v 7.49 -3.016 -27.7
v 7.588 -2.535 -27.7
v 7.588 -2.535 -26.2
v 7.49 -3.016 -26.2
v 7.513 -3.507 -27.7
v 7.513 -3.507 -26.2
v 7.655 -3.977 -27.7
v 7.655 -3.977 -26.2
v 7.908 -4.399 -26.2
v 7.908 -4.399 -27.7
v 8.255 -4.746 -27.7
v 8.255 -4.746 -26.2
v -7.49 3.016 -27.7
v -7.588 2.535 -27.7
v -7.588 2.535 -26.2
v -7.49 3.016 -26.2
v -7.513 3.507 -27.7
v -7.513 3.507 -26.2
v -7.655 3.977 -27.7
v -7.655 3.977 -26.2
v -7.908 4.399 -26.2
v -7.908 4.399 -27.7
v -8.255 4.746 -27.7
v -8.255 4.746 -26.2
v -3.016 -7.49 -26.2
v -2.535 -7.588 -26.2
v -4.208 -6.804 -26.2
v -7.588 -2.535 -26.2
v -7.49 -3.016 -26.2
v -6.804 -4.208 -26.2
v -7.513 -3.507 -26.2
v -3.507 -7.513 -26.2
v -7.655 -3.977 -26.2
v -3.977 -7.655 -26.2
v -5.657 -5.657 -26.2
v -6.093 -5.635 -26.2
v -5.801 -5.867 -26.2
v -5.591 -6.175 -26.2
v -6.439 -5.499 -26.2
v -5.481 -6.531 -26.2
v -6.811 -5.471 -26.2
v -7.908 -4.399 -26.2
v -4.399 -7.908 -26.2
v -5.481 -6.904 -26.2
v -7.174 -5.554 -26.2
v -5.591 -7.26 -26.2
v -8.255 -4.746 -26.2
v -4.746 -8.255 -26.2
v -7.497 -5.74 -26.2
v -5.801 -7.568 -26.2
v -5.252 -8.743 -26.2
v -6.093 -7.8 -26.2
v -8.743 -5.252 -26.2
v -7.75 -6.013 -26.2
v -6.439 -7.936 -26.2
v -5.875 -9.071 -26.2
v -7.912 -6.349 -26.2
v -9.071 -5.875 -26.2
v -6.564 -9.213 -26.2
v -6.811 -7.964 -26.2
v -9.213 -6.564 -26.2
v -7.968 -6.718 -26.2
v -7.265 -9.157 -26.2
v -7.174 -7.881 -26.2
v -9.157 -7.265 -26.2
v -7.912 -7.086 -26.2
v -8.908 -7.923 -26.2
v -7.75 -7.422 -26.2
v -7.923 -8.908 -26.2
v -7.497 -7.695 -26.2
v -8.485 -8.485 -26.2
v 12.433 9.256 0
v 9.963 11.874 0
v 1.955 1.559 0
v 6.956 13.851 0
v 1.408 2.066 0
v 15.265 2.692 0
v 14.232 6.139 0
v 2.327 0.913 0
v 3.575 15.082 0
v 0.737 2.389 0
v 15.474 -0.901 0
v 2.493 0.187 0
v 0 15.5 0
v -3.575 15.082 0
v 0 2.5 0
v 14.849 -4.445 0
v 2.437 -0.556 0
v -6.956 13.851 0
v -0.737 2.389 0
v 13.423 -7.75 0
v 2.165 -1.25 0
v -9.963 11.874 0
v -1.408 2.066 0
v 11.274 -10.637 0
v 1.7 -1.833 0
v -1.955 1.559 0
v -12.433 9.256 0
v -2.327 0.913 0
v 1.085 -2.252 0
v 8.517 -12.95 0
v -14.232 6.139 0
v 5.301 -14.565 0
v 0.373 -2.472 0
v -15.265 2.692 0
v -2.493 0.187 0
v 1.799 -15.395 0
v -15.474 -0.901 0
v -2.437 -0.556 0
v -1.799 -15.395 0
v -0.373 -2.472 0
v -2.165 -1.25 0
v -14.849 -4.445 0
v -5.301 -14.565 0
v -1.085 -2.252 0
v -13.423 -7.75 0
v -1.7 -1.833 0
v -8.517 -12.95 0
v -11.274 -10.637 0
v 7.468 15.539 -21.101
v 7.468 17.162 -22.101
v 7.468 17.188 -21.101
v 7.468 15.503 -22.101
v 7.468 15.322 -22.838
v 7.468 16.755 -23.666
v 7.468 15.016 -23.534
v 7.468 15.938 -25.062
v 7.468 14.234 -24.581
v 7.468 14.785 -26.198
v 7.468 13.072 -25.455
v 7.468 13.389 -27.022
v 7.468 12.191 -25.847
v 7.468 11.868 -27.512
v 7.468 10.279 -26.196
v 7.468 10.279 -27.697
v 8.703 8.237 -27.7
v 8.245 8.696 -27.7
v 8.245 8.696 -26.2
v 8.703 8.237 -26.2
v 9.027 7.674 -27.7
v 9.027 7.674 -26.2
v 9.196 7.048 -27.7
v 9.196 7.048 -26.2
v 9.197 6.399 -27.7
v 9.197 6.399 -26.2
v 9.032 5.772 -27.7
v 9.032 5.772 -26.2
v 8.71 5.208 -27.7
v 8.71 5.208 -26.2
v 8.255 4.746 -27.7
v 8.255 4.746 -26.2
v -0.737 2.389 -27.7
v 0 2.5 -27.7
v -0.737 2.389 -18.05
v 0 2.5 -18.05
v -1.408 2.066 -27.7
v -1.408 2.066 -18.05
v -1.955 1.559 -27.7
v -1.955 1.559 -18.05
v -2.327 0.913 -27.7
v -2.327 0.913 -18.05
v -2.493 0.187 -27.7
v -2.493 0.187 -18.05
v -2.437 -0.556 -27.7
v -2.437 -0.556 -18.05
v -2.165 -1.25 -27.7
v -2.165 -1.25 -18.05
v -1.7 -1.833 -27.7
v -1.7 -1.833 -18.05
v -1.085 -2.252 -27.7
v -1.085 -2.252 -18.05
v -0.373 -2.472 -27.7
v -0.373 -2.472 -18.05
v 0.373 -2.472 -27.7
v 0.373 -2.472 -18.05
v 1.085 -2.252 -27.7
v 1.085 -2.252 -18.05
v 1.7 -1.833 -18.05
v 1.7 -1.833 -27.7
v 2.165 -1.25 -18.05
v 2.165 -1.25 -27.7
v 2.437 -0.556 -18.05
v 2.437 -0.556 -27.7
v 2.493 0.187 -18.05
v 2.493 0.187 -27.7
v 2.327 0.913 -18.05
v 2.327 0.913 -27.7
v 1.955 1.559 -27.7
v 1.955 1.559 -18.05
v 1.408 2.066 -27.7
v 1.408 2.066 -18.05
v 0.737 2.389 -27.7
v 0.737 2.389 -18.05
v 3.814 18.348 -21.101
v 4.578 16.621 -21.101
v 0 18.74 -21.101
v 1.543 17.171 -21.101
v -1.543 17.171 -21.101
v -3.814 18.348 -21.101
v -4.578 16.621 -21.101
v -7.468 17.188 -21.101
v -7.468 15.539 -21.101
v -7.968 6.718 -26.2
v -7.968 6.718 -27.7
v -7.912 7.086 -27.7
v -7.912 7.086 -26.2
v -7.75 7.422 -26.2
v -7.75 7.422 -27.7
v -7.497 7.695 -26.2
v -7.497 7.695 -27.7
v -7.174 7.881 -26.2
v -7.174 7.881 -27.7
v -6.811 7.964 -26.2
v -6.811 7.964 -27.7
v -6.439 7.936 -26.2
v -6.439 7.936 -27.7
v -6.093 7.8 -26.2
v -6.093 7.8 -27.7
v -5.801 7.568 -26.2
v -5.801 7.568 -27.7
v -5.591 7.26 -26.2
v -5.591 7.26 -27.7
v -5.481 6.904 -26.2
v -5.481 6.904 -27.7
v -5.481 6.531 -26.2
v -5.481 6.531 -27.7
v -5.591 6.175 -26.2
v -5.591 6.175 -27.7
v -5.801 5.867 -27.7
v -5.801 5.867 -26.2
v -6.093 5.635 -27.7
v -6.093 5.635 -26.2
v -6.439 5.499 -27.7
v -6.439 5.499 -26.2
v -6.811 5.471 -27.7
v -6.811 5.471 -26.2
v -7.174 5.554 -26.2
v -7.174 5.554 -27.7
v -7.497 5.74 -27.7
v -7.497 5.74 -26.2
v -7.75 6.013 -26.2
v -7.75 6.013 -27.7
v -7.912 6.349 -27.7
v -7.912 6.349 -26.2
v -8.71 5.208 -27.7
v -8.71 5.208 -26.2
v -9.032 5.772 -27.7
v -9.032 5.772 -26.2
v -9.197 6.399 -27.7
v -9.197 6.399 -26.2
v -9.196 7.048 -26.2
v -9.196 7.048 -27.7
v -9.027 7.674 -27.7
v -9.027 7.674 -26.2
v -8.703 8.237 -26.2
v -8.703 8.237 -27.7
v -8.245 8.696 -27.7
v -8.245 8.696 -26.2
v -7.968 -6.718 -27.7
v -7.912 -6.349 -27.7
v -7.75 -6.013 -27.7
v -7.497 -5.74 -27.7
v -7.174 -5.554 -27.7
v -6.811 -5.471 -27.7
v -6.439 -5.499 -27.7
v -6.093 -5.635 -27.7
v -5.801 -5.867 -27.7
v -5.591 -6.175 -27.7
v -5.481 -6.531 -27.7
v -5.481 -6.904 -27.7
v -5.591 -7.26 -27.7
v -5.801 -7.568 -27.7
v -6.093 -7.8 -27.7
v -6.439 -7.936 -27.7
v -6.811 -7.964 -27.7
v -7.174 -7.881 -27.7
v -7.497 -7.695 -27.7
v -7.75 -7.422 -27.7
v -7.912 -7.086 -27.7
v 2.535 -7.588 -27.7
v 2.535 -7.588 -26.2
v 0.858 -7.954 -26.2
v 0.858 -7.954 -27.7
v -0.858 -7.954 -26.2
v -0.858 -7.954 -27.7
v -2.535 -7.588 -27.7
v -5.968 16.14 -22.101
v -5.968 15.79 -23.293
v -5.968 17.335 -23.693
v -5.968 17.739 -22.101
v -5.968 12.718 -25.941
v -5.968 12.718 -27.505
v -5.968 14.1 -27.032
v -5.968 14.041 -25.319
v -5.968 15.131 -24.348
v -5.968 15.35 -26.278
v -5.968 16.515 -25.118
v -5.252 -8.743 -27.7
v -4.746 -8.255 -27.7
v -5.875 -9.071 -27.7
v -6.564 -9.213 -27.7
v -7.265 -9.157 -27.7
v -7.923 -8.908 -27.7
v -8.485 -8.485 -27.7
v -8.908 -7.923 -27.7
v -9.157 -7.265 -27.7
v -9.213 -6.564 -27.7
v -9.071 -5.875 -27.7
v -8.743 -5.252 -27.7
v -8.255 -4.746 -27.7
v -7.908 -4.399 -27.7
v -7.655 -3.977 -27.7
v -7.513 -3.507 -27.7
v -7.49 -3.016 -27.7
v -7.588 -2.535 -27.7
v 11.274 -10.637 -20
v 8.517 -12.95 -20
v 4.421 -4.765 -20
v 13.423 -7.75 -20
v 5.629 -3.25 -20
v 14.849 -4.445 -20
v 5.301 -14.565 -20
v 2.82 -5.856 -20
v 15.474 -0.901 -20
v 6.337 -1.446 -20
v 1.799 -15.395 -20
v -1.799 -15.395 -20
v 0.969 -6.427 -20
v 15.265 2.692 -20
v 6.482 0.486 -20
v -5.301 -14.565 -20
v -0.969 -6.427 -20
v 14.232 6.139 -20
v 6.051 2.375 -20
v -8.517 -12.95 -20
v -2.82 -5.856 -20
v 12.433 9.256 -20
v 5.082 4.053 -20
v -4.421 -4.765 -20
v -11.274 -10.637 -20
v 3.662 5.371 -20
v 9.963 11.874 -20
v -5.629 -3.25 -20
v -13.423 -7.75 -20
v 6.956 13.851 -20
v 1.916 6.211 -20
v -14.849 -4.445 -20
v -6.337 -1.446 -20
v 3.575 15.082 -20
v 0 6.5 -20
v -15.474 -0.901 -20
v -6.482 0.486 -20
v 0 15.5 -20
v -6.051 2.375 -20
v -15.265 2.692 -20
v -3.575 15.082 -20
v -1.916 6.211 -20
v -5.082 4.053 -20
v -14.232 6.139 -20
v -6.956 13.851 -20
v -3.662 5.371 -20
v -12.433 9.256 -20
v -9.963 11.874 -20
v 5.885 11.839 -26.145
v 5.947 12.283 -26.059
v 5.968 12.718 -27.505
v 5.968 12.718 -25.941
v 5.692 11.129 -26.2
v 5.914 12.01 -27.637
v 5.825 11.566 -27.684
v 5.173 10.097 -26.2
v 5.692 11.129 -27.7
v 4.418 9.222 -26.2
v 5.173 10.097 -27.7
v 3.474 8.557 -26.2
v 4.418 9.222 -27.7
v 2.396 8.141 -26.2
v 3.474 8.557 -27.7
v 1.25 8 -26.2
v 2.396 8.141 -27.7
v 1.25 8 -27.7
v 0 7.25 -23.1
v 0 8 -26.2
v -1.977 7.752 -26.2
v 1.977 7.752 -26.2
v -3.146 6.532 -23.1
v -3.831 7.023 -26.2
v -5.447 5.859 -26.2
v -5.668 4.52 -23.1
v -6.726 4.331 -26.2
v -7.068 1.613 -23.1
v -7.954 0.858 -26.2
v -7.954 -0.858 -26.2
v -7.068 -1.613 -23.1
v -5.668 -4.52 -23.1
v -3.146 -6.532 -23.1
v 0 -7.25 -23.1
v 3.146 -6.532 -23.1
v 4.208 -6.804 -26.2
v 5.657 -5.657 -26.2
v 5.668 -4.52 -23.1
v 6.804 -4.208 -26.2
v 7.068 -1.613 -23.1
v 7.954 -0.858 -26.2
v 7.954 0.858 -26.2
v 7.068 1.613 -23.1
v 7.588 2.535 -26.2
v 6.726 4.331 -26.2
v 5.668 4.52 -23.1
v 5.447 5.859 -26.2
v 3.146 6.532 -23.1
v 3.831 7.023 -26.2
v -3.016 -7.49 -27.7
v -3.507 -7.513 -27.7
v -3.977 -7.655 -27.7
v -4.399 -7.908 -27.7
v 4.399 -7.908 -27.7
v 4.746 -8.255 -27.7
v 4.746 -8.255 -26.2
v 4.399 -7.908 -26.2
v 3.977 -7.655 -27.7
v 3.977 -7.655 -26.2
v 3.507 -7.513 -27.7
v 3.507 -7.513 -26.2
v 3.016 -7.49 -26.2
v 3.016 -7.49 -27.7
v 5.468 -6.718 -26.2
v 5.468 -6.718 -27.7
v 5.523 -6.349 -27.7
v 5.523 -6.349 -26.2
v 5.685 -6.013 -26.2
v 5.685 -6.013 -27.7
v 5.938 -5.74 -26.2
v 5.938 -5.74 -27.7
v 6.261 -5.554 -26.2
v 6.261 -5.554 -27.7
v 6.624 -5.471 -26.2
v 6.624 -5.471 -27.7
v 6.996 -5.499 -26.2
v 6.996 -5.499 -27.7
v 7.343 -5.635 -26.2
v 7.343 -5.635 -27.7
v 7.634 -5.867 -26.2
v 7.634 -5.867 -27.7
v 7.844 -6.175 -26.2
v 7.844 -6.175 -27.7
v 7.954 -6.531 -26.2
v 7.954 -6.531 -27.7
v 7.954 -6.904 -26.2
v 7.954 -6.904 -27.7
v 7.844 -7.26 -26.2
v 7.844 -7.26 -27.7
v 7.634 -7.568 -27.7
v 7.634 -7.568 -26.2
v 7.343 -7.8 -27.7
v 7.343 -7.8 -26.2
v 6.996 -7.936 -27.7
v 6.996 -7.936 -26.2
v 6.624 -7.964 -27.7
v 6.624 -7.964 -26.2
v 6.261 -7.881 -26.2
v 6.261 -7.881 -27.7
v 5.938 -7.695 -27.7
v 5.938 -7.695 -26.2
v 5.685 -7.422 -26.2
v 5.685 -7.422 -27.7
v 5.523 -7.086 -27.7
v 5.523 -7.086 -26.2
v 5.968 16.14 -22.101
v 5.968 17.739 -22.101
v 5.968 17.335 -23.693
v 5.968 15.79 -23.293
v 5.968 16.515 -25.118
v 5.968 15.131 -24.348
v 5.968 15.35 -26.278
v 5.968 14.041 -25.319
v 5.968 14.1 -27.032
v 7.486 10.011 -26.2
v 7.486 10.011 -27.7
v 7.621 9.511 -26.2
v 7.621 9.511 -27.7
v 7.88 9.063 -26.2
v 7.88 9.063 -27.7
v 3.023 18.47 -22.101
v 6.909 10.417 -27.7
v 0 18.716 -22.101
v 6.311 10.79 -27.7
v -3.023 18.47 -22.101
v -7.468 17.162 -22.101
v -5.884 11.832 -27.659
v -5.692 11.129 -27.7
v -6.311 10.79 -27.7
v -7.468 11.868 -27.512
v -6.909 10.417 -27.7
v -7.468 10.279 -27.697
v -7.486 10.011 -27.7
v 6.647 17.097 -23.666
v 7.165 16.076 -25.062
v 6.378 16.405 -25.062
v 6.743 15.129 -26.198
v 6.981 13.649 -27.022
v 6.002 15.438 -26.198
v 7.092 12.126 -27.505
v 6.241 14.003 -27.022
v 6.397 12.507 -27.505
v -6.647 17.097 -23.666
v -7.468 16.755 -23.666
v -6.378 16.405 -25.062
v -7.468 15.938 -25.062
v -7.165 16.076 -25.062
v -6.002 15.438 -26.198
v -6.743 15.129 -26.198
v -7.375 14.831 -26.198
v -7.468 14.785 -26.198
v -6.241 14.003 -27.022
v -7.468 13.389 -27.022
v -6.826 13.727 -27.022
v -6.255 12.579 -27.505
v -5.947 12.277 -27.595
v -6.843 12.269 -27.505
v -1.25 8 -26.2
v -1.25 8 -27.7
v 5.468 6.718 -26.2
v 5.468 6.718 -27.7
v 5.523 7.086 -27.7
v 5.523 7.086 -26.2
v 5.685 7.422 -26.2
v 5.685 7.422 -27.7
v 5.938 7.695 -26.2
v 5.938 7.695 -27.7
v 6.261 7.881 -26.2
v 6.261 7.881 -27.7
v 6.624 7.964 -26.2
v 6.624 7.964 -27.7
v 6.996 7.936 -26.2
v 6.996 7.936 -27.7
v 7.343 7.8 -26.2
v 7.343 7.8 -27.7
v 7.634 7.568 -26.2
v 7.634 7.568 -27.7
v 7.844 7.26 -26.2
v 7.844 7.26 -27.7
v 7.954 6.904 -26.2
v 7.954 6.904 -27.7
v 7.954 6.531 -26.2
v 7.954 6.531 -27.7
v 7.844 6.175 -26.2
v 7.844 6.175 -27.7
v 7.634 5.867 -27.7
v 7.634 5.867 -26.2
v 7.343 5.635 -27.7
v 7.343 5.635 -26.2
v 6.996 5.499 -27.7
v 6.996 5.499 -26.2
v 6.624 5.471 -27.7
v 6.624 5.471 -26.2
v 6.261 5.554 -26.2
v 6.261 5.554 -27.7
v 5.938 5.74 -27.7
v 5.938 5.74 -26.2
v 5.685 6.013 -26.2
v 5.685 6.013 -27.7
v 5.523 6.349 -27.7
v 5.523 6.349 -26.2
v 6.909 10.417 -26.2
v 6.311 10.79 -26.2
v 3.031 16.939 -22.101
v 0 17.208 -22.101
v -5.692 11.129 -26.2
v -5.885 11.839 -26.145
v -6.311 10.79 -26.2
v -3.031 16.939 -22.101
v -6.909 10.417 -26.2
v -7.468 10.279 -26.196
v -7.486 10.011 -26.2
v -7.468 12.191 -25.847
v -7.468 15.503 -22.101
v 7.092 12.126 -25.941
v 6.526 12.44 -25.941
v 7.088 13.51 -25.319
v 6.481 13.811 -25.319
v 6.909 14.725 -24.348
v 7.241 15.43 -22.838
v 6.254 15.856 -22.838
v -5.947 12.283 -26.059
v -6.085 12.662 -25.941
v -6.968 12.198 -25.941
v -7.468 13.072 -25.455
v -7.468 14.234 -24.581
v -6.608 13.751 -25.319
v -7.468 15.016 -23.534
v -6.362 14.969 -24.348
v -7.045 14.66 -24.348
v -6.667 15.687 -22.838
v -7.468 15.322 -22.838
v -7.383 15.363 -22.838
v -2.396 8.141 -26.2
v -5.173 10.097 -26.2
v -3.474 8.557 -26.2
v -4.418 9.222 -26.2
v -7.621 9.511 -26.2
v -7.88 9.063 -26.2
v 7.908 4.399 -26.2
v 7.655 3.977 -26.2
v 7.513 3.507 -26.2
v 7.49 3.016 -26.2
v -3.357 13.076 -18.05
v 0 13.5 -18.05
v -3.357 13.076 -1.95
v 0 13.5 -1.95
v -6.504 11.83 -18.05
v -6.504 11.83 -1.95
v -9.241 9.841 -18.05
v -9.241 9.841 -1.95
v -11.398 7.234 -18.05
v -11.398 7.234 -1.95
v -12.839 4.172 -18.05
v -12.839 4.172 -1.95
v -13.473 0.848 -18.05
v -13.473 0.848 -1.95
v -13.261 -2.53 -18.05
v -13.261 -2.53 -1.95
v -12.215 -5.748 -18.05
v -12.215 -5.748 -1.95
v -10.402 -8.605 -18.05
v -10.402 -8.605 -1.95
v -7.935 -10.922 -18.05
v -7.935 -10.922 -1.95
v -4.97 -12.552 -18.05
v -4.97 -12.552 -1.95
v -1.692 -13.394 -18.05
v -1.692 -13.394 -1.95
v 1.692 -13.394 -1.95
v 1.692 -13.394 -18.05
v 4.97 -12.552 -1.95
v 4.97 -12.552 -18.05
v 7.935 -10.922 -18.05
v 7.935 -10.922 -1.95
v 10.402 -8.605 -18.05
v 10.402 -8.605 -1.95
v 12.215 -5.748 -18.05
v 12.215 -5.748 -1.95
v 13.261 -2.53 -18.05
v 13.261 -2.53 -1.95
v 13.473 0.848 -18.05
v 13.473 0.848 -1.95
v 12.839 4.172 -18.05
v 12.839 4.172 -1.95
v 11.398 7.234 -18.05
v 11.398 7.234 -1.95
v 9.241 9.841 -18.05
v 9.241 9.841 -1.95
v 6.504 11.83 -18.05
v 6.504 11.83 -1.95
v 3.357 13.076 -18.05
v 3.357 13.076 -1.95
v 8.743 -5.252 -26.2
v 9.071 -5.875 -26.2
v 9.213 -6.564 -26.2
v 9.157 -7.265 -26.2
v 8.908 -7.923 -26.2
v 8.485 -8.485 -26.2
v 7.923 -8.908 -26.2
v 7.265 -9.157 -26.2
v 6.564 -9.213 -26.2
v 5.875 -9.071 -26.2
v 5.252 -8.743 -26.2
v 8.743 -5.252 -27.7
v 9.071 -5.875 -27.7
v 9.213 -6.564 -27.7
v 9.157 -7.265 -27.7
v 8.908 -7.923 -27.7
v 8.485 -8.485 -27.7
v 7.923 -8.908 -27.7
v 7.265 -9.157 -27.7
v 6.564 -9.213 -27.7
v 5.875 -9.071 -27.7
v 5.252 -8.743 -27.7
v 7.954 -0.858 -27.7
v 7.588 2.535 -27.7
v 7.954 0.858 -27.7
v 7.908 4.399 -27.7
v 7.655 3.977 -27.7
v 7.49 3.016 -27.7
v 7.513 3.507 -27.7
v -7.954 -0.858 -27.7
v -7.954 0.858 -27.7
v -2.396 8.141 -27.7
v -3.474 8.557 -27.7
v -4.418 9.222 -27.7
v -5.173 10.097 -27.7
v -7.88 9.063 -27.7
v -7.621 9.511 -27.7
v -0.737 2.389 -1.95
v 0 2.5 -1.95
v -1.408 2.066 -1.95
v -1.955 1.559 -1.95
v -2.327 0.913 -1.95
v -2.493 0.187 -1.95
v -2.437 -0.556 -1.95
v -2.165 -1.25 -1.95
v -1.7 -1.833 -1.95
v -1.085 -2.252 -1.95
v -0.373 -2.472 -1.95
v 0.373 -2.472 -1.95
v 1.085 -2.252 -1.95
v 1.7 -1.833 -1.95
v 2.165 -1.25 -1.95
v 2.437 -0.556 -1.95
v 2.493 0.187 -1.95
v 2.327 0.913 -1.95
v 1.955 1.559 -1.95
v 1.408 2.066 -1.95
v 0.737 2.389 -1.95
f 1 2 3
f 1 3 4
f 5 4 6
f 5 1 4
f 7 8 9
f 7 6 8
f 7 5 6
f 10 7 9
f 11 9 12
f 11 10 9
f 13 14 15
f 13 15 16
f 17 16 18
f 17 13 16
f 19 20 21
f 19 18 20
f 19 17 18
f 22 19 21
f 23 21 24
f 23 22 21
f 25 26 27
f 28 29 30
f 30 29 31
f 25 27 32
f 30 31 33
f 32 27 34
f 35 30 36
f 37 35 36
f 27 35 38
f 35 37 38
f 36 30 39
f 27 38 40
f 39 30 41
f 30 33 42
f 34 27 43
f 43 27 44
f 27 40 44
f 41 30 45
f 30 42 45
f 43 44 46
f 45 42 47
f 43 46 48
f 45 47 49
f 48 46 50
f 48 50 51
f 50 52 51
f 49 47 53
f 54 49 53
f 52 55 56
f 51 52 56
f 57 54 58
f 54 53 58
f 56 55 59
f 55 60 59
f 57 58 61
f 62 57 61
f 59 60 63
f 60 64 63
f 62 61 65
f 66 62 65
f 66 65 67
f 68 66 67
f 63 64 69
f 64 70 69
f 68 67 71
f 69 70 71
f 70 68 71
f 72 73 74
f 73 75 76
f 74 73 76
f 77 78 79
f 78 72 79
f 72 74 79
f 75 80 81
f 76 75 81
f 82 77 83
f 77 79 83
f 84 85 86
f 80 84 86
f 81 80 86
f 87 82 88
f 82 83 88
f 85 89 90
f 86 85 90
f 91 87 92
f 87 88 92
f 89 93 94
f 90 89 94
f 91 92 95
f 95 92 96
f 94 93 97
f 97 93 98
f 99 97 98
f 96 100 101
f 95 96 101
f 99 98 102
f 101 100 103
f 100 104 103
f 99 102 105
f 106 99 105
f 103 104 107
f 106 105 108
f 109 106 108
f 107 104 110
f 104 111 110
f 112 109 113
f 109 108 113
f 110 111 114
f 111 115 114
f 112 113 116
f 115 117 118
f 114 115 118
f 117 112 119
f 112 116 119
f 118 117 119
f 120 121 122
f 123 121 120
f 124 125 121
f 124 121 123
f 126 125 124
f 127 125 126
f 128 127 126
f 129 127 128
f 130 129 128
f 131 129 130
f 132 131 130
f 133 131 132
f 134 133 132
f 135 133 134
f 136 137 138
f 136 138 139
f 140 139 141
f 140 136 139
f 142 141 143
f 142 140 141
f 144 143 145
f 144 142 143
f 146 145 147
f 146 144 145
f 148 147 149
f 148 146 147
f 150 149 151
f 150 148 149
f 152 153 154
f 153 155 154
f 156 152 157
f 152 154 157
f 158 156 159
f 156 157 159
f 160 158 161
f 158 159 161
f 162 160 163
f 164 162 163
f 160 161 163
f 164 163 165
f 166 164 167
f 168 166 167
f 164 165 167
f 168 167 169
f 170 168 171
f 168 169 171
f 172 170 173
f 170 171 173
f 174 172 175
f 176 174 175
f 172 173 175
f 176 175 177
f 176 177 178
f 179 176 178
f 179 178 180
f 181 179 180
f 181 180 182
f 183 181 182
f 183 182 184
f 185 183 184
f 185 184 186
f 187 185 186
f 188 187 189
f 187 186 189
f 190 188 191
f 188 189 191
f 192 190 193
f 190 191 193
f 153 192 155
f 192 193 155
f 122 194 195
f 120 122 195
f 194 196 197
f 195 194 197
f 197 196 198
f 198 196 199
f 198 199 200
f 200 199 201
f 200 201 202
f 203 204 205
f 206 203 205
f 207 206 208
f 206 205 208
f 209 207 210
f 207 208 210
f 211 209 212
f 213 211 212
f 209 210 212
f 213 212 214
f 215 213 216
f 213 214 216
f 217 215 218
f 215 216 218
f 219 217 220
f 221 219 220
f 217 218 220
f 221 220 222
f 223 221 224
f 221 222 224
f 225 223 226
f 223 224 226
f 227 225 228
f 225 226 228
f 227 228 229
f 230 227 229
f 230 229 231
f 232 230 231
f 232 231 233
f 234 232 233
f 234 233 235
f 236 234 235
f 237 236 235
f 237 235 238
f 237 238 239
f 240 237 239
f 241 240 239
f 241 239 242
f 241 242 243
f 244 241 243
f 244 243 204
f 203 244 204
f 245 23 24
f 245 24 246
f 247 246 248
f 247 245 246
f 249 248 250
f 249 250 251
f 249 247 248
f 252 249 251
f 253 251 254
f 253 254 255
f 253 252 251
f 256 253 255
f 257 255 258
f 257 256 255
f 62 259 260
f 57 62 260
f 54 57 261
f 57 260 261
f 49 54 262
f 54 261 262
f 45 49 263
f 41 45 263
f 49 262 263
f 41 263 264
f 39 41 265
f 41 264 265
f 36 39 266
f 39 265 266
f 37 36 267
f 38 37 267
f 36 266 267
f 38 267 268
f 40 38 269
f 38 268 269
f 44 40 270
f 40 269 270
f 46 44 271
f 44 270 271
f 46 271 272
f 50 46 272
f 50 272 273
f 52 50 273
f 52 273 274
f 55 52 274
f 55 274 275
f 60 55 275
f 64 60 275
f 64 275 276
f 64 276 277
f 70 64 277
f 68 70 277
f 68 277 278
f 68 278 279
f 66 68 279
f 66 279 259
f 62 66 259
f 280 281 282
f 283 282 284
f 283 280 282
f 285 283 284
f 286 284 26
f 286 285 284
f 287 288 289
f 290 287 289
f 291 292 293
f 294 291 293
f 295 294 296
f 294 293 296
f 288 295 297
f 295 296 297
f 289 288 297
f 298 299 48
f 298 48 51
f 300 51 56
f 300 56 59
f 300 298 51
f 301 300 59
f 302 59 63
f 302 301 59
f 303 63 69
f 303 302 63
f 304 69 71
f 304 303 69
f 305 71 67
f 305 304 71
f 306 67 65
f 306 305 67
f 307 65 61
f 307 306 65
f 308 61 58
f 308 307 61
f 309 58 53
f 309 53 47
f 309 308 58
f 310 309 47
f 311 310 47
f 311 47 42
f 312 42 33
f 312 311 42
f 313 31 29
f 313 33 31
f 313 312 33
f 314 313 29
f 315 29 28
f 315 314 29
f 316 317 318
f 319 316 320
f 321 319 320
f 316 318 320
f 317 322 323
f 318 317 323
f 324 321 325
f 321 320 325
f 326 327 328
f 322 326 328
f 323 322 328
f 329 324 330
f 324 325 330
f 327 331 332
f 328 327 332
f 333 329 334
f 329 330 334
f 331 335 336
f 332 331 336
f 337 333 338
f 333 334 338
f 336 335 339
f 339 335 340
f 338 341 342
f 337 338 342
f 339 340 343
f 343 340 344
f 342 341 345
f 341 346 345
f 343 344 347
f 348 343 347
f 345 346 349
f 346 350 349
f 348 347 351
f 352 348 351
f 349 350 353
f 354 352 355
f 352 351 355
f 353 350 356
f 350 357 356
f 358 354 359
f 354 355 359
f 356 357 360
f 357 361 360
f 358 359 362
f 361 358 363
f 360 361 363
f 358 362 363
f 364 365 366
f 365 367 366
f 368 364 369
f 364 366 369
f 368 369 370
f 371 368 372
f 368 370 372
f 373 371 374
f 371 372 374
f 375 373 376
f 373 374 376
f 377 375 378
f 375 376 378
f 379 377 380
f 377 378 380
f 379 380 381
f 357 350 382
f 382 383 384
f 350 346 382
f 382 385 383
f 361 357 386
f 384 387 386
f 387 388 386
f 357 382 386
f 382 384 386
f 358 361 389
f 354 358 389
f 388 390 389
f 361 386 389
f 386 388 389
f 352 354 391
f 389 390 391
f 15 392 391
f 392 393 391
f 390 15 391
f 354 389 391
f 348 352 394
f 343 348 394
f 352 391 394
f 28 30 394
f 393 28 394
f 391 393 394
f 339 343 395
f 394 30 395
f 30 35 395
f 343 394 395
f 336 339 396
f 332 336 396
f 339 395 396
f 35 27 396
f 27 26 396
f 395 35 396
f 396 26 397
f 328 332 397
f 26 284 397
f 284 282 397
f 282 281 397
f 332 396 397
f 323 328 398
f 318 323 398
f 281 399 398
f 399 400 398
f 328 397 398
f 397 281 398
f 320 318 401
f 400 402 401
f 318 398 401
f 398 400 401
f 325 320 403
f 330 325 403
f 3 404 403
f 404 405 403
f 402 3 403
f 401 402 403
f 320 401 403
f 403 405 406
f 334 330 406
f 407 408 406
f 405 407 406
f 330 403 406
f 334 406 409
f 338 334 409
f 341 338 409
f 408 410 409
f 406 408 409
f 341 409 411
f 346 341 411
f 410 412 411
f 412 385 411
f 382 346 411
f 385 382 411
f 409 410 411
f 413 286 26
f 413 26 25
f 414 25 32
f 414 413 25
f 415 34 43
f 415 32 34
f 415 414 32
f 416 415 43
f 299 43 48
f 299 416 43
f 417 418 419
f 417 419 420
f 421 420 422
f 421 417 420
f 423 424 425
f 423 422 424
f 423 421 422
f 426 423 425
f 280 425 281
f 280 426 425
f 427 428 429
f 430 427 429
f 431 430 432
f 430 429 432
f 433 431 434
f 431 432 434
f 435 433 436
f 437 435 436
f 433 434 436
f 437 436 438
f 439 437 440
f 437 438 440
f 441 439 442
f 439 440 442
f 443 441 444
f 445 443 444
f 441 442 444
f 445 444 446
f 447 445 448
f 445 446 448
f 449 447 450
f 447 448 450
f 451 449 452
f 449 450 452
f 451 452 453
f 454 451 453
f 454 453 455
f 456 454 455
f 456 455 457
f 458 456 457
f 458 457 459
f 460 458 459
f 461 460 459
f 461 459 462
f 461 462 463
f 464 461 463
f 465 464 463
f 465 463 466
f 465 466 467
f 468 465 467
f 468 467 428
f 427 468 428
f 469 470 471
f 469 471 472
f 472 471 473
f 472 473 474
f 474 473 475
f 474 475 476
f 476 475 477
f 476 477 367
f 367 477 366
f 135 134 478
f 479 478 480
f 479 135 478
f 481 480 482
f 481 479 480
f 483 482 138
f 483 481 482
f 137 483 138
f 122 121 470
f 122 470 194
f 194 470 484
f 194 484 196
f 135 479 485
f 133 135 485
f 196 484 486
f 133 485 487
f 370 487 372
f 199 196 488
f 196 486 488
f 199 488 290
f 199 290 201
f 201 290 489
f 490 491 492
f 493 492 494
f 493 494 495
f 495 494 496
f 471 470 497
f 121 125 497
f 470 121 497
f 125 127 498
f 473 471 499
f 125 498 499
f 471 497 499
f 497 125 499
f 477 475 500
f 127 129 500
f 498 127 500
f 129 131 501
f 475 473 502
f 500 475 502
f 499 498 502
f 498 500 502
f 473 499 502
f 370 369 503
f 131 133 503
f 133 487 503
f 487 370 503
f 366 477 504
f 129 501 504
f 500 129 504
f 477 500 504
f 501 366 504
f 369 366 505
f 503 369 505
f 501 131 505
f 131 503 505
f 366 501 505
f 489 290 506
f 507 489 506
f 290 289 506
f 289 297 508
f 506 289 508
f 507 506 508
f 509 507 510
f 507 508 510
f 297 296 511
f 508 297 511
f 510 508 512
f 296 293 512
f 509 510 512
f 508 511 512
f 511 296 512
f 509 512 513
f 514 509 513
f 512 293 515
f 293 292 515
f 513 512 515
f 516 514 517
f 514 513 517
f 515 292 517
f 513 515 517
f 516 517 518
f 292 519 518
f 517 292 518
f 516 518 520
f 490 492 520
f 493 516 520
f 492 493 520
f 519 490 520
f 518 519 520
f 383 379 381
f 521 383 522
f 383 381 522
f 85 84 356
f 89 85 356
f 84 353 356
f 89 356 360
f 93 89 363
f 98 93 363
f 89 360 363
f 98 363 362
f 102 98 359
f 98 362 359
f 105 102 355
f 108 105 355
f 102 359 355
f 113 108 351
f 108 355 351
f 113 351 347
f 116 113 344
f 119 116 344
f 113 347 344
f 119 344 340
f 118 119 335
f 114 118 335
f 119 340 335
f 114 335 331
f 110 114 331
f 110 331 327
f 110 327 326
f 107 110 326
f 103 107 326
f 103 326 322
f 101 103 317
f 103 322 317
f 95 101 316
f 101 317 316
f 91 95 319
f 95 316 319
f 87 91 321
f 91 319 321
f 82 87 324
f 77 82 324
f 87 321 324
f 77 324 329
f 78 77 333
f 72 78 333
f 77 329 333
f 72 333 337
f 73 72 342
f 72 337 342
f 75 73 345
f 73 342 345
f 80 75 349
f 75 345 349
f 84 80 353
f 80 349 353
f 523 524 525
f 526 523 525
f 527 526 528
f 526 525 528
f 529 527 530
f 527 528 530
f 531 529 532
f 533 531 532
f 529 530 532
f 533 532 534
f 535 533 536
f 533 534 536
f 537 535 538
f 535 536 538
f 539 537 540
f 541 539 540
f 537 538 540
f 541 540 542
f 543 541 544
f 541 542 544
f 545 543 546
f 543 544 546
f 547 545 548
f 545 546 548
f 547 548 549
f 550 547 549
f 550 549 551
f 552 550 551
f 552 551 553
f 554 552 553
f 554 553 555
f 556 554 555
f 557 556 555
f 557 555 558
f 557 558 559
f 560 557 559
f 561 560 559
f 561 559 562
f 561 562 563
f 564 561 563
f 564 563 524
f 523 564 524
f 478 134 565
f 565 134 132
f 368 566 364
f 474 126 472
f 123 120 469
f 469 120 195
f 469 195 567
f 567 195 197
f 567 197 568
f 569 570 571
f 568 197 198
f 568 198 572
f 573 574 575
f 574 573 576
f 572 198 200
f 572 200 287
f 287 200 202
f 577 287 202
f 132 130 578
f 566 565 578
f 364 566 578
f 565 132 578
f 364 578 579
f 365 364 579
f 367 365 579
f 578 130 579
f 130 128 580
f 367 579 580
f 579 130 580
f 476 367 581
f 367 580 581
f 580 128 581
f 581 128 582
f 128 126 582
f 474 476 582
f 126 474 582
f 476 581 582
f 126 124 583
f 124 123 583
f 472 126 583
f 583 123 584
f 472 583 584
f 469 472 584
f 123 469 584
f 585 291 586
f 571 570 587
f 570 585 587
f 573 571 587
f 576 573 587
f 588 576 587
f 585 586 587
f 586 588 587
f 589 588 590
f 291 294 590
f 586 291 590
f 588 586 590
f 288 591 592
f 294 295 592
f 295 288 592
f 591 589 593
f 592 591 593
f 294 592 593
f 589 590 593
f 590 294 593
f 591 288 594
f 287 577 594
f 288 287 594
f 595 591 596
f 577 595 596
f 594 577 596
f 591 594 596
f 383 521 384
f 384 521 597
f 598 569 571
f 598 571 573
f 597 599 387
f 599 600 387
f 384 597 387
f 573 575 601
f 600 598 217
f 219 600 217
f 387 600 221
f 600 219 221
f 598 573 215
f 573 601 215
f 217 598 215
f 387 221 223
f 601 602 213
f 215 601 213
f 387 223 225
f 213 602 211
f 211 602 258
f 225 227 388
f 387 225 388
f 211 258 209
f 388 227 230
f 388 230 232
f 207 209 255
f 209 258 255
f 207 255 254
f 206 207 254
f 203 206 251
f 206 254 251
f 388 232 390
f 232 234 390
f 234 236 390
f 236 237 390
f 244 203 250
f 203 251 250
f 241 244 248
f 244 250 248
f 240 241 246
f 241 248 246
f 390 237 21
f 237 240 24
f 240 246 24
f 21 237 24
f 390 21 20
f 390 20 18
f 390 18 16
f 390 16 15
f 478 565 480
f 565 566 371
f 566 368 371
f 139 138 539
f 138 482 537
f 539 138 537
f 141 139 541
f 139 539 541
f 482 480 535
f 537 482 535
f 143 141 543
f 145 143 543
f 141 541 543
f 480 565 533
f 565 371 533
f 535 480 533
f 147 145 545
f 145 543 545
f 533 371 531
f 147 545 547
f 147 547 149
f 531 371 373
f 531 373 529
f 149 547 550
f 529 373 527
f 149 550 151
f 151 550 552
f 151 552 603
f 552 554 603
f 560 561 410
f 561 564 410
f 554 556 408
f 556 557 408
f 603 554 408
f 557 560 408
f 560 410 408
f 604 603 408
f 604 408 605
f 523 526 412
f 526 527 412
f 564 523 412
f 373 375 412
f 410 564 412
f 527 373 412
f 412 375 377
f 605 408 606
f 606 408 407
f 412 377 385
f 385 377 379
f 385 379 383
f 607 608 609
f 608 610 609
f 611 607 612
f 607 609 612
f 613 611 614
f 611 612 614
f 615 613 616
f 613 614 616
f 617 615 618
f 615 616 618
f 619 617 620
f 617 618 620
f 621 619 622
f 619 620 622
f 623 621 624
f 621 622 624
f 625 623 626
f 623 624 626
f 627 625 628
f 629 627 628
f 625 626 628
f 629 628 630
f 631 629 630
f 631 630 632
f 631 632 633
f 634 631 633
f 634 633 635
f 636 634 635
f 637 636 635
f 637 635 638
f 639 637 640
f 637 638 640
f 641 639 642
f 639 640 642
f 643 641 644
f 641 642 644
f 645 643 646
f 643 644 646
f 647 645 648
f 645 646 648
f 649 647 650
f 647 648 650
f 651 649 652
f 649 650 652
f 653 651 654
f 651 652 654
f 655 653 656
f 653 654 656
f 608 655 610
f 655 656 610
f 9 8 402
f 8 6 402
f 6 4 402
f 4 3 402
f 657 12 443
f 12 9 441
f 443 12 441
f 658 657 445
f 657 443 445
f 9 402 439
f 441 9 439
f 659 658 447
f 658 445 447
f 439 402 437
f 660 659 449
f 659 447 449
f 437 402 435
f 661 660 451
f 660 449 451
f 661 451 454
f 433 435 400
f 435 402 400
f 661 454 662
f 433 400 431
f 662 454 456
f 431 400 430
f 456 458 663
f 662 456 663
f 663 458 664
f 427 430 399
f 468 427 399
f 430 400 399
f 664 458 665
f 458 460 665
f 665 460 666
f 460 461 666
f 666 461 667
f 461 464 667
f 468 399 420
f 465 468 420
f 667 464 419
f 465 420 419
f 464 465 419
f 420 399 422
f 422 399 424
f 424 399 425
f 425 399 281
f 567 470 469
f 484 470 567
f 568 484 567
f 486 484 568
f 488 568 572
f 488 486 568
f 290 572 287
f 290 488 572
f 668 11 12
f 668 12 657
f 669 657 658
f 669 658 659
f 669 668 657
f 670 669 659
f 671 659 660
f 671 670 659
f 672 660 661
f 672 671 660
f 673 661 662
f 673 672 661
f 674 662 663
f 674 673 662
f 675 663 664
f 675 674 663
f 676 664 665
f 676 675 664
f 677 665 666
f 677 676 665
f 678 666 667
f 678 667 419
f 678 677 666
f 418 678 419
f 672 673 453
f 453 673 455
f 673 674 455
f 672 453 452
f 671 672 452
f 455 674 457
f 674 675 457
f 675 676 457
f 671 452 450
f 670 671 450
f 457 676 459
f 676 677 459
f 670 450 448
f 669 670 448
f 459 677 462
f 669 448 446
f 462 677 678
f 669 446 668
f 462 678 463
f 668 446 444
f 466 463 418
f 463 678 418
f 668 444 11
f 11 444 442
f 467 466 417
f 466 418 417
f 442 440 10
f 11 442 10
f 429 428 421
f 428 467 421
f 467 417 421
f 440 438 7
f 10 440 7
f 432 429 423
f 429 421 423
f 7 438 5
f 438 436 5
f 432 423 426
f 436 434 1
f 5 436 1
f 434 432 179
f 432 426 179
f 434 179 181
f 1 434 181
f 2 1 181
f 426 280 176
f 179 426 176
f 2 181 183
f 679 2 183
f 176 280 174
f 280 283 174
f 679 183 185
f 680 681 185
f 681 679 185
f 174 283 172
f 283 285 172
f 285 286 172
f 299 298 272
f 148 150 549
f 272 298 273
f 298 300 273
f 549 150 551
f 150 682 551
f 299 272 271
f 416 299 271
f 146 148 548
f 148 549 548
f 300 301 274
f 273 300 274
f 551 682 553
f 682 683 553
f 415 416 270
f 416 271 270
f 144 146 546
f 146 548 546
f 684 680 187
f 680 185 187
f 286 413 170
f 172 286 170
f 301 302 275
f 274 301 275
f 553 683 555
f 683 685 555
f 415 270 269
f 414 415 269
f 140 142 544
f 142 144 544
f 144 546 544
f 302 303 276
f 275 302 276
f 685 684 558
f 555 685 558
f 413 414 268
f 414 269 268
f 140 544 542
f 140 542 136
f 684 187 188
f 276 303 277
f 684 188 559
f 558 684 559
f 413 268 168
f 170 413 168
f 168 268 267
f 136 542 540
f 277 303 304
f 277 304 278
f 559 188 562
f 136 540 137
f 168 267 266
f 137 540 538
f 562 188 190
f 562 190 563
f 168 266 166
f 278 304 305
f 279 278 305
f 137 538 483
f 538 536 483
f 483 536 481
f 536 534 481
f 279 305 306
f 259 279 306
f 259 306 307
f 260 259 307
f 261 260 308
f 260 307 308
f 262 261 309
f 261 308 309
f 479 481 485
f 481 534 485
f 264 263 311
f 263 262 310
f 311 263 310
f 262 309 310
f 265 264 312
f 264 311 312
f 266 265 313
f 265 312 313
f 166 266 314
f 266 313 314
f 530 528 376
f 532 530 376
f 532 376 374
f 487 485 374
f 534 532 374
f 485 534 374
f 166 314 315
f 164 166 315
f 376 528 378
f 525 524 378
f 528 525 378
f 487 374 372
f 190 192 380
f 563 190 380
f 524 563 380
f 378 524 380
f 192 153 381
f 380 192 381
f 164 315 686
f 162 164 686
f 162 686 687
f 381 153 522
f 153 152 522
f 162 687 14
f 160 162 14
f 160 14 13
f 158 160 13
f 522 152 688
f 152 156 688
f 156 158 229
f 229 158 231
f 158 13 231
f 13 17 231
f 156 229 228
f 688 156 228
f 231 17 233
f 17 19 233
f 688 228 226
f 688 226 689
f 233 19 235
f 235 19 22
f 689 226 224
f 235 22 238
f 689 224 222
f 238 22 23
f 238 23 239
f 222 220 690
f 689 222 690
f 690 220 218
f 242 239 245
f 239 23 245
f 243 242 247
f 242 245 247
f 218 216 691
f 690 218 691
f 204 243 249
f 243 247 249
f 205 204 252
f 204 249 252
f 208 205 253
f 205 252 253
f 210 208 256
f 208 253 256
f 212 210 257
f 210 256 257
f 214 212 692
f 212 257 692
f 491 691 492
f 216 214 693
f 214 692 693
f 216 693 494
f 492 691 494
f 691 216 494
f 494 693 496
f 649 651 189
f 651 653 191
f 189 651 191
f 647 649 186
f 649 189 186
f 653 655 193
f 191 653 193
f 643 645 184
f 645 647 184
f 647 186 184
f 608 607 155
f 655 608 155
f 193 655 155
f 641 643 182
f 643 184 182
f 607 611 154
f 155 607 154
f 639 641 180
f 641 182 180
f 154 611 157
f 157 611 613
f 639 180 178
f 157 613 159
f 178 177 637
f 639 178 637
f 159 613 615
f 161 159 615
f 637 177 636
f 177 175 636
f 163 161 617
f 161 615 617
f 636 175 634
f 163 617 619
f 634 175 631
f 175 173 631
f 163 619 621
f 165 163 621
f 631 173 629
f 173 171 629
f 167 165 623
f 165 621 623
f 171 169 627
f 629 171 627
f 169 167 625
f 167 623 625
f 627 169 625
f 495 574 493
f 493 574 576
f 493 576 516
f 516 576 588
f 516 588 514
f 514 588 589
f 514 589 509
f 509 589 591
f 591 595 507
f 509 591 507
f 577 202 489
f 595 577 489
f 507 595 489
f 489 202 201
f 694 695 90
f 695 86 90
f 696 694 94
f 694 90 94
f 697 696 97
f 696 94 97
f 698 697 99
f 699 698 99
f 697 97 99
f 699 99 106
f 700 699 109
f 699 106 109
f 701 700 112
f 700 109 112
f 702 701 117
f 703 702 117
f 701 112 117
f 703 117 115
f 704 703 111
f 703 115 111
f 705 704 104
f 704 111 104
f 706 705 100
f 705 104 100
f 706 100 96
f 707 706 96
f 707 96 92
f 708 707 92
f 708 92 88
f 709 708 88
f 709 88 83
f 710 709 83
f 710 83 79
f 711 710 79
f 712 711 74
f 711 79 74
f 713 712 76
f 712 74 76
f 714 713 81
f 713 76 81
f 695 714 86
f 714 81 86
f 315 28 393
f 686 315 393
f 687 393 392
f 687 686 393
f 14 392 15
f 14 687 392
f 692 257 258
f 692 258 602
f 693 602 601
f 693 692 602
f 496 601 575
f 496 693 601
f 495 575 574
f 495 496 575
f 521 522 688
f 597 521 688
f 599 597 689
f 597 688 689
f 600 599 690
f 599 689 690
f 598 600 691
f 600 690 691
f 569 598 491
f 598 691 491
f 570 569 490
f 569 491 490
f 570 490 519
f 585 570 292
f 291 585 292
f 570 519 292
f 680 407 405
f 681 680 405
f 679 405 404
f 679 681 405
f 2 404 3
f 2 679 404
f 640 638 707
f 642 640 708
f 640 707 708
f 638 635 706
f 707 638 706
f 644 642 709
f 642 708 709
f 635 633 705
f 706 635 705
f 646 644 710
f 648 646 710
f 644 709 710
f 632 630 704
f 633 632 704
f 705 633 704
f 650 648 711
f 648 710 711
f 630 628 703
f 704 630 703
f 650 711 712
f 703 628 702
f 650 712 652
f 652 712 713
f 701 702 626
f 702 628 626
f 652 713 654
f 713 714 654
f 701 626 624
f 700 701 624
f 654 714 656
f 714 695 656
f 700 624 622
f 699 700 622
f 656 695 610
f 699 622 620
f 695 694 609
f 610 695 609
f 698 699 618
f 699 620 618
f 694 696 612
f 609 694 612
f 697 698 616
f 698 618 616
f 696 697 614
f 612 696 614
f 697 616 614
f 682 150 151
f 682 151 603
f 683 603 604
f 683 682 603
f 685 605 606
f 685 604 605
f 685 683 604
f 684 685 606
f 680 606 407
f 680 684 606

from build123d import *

# Parameters (mm, degrees)
SKETCH2_R          = 1.25
CUT_EXTRUDE1_DEPTH = 5.599304
CUT_EXTRUDE2_REACH = 8.599


with BuildPart() as part:
    # Sketch1 → Revolve1 (revolve)
    with BuildSketch(Plane(origin=(0, 0, 0), x_dir=(0, 0, -1), z_dir=(1, 0, 0))):
        with BuildLine():
            Line((0, 15.5), (20, 15.5))
            Line((20, 15.5), (20, 6.5))
            Line((20, 6.5), (26.2, 8))
            Line((26.2, 8), (26.2, 12.5))
            ThreePointArc((26.2, 12.5), (24.683117, 15.981117), (21.100696, 17.240231))
            Line((21.100696, 17.240231), (21.100696, 18.740231))
            ThreePointArc((21.100696, 18.740231), (25.744144, 17.041236), (27.7, 12.5))
            Line((27.7, 12.5), (27.7, 2.5))
            Line((27.7, 2.5), (20, 2.5))
            Line((20, 2.5), (18.05, 2.5))
            Line((18.05, 2.5), (18.05, 13.5))
            Line((18.05, 13.5), (1.95, 13.5))
            Line((1.95, 13.5), (1.95, 2.5))
            Line((1.95, 2.5), (0, 2.5))
            Line((0, 2.5), (0, 15.5))
        make_face()
    revolve(axis=Axis((0, 0, -20), (0, 0, 1)))

    # Sketch2 → Cut-Extrude1 (cut)
    with BuildSketch(Plane(origin=(0, 0, -27.7), x_dir=(-1, 0, 0), z_dir=(0, 0, -1))):
        with Locations((-6.717514, 6.717514)):
            Circle(SKETCH2_R)
        with Locations((6.717514, 6.717514)):
            Circle(SKETCH2_R)
        with Locations((6.717514, -6.717514)):
            Circle(SKETCH2_R)
        with Locations((-6.717514, -6.717514)):
            Circle(SKETCH2_R)
        with BuildLine():
            Line((-5.967514, 23.416114), (-5.967514, 12.717514))
            ThreePointArc((-5.967514, 12.717514), (-4.585786, 9.381728), (-1.25, 8))
            Line((-1.25, 8), (1.25, 8))
            ThreePointArc((1.25, 8), (4.585786, 9.381728), (5.967514, 12.717514))
            Line((5.967514, 12.717514), (5.967514, 23.416114))
            Line((5.967514, 23.416114), (-5.967514, 23.416114))
        make_face()
        with BuildLine():
            Line((-7.467514, 23.416114), (-7.467514, 10.279466))
            ThreePointArc((-7.467514, 10.279466), (-7.672459, 9.397549), (-8.245292, 8.696376))
            ThreePointArc((-8.245292, 8.696376), (-9.217507, 6.723535), (-8.254806, 4.746034))
            ThreePointArc((-8.254806, 4.746034), (-7.569897, 3.746571), (-7.587712, 2.53508))
            ThreePointArc((-7.587712, 2.53508), (-8, 0), (-7.587712, -2.53508))
            ThreePointArc((-7.587712, -2.53508), (-7.569897, -3.746571), (-8.254806, -4.746034))
            ThreePointArc((-8.254806, -4.746034), (-8.485281, -8.485281), (-4.746034, -8.254806))
            ThreePointArc((-4.746034, -8.254806), (-3.746571, -7.569897), (-2.53508, -7.587712))
            ThreePointArc((-2.53508, -7.587712), (0, -8), (2.53508, -7.587712))
            ThreePointArc((2.53508, -7.587712), (3.746571, -7.569897), (4.746034, -8.254806))
            ThreePointArc((4.746034, -8.254806), (8.485281, -8.485281), (8.254806, -4.746034))
            ThreePointArc((8.254806, -4.746034), (7.569897, -3.746571), (7.587712, -2.53508))
            ThreePointArc((7.587712, -2.53508), (8, 0), (7.587712, 2.53508))
            ThreePointArc((7.587712, 2.53508), (7.569897, 3.746571), (8.254806, 4.746034))
            ThreePointArc((8.254806, 4.746034), (9.217507, 6.723535), (8.245292, 8.696376))
            ThreePointArc((8.245292, 8.696376), (7.672459, 9.397549), (7.467514, 10.279466))
            Line((7.467514, 10.279466), (7.467514, 23.416114))
            ThreePointArc((7.467514, 23.416114), (0, -26.279016), (-7.467514, 23.416114))
        make_face()
    extrude(amount=-CUT_EXTRUDE1_DEPTH, mode=Mode.SUBTRACT)

    # Sketch3 → Cut-Extrude2 (cut, up to next)
    with BuildSketch(Plane.XY.offset(-21.100696), mode=Mode.PRIVATE) as cut_extrude2_sk1:
        with BuildLine():
            Line((7.467514, 17.1988), (7.467514, 15.502966))
            ThreePointArc((7.467514, 15.502966), (0, -17.207723), (-7.467514, 15.502966))
            Line((-7.467514, 15.502966), (-7.467514, 17.1988))
            ThreePointArc((-7.467514, 17.1988), (0, -18.75), (7.467514, 17.1988))
        make_face()
    cut_extrude2_tool1 = extrude(cut_extrude2_sk1.sketch, amount=-CUT_EXTRUDE2_REACH, mode=Mode.PRIVATE) & part.part
    add(cut_extrude2_tool1.solids().sort_by_distance((7.986992, 16.350883, -21.100696))[0], mode=Mode.SUBTRACT)


solid = part.part
